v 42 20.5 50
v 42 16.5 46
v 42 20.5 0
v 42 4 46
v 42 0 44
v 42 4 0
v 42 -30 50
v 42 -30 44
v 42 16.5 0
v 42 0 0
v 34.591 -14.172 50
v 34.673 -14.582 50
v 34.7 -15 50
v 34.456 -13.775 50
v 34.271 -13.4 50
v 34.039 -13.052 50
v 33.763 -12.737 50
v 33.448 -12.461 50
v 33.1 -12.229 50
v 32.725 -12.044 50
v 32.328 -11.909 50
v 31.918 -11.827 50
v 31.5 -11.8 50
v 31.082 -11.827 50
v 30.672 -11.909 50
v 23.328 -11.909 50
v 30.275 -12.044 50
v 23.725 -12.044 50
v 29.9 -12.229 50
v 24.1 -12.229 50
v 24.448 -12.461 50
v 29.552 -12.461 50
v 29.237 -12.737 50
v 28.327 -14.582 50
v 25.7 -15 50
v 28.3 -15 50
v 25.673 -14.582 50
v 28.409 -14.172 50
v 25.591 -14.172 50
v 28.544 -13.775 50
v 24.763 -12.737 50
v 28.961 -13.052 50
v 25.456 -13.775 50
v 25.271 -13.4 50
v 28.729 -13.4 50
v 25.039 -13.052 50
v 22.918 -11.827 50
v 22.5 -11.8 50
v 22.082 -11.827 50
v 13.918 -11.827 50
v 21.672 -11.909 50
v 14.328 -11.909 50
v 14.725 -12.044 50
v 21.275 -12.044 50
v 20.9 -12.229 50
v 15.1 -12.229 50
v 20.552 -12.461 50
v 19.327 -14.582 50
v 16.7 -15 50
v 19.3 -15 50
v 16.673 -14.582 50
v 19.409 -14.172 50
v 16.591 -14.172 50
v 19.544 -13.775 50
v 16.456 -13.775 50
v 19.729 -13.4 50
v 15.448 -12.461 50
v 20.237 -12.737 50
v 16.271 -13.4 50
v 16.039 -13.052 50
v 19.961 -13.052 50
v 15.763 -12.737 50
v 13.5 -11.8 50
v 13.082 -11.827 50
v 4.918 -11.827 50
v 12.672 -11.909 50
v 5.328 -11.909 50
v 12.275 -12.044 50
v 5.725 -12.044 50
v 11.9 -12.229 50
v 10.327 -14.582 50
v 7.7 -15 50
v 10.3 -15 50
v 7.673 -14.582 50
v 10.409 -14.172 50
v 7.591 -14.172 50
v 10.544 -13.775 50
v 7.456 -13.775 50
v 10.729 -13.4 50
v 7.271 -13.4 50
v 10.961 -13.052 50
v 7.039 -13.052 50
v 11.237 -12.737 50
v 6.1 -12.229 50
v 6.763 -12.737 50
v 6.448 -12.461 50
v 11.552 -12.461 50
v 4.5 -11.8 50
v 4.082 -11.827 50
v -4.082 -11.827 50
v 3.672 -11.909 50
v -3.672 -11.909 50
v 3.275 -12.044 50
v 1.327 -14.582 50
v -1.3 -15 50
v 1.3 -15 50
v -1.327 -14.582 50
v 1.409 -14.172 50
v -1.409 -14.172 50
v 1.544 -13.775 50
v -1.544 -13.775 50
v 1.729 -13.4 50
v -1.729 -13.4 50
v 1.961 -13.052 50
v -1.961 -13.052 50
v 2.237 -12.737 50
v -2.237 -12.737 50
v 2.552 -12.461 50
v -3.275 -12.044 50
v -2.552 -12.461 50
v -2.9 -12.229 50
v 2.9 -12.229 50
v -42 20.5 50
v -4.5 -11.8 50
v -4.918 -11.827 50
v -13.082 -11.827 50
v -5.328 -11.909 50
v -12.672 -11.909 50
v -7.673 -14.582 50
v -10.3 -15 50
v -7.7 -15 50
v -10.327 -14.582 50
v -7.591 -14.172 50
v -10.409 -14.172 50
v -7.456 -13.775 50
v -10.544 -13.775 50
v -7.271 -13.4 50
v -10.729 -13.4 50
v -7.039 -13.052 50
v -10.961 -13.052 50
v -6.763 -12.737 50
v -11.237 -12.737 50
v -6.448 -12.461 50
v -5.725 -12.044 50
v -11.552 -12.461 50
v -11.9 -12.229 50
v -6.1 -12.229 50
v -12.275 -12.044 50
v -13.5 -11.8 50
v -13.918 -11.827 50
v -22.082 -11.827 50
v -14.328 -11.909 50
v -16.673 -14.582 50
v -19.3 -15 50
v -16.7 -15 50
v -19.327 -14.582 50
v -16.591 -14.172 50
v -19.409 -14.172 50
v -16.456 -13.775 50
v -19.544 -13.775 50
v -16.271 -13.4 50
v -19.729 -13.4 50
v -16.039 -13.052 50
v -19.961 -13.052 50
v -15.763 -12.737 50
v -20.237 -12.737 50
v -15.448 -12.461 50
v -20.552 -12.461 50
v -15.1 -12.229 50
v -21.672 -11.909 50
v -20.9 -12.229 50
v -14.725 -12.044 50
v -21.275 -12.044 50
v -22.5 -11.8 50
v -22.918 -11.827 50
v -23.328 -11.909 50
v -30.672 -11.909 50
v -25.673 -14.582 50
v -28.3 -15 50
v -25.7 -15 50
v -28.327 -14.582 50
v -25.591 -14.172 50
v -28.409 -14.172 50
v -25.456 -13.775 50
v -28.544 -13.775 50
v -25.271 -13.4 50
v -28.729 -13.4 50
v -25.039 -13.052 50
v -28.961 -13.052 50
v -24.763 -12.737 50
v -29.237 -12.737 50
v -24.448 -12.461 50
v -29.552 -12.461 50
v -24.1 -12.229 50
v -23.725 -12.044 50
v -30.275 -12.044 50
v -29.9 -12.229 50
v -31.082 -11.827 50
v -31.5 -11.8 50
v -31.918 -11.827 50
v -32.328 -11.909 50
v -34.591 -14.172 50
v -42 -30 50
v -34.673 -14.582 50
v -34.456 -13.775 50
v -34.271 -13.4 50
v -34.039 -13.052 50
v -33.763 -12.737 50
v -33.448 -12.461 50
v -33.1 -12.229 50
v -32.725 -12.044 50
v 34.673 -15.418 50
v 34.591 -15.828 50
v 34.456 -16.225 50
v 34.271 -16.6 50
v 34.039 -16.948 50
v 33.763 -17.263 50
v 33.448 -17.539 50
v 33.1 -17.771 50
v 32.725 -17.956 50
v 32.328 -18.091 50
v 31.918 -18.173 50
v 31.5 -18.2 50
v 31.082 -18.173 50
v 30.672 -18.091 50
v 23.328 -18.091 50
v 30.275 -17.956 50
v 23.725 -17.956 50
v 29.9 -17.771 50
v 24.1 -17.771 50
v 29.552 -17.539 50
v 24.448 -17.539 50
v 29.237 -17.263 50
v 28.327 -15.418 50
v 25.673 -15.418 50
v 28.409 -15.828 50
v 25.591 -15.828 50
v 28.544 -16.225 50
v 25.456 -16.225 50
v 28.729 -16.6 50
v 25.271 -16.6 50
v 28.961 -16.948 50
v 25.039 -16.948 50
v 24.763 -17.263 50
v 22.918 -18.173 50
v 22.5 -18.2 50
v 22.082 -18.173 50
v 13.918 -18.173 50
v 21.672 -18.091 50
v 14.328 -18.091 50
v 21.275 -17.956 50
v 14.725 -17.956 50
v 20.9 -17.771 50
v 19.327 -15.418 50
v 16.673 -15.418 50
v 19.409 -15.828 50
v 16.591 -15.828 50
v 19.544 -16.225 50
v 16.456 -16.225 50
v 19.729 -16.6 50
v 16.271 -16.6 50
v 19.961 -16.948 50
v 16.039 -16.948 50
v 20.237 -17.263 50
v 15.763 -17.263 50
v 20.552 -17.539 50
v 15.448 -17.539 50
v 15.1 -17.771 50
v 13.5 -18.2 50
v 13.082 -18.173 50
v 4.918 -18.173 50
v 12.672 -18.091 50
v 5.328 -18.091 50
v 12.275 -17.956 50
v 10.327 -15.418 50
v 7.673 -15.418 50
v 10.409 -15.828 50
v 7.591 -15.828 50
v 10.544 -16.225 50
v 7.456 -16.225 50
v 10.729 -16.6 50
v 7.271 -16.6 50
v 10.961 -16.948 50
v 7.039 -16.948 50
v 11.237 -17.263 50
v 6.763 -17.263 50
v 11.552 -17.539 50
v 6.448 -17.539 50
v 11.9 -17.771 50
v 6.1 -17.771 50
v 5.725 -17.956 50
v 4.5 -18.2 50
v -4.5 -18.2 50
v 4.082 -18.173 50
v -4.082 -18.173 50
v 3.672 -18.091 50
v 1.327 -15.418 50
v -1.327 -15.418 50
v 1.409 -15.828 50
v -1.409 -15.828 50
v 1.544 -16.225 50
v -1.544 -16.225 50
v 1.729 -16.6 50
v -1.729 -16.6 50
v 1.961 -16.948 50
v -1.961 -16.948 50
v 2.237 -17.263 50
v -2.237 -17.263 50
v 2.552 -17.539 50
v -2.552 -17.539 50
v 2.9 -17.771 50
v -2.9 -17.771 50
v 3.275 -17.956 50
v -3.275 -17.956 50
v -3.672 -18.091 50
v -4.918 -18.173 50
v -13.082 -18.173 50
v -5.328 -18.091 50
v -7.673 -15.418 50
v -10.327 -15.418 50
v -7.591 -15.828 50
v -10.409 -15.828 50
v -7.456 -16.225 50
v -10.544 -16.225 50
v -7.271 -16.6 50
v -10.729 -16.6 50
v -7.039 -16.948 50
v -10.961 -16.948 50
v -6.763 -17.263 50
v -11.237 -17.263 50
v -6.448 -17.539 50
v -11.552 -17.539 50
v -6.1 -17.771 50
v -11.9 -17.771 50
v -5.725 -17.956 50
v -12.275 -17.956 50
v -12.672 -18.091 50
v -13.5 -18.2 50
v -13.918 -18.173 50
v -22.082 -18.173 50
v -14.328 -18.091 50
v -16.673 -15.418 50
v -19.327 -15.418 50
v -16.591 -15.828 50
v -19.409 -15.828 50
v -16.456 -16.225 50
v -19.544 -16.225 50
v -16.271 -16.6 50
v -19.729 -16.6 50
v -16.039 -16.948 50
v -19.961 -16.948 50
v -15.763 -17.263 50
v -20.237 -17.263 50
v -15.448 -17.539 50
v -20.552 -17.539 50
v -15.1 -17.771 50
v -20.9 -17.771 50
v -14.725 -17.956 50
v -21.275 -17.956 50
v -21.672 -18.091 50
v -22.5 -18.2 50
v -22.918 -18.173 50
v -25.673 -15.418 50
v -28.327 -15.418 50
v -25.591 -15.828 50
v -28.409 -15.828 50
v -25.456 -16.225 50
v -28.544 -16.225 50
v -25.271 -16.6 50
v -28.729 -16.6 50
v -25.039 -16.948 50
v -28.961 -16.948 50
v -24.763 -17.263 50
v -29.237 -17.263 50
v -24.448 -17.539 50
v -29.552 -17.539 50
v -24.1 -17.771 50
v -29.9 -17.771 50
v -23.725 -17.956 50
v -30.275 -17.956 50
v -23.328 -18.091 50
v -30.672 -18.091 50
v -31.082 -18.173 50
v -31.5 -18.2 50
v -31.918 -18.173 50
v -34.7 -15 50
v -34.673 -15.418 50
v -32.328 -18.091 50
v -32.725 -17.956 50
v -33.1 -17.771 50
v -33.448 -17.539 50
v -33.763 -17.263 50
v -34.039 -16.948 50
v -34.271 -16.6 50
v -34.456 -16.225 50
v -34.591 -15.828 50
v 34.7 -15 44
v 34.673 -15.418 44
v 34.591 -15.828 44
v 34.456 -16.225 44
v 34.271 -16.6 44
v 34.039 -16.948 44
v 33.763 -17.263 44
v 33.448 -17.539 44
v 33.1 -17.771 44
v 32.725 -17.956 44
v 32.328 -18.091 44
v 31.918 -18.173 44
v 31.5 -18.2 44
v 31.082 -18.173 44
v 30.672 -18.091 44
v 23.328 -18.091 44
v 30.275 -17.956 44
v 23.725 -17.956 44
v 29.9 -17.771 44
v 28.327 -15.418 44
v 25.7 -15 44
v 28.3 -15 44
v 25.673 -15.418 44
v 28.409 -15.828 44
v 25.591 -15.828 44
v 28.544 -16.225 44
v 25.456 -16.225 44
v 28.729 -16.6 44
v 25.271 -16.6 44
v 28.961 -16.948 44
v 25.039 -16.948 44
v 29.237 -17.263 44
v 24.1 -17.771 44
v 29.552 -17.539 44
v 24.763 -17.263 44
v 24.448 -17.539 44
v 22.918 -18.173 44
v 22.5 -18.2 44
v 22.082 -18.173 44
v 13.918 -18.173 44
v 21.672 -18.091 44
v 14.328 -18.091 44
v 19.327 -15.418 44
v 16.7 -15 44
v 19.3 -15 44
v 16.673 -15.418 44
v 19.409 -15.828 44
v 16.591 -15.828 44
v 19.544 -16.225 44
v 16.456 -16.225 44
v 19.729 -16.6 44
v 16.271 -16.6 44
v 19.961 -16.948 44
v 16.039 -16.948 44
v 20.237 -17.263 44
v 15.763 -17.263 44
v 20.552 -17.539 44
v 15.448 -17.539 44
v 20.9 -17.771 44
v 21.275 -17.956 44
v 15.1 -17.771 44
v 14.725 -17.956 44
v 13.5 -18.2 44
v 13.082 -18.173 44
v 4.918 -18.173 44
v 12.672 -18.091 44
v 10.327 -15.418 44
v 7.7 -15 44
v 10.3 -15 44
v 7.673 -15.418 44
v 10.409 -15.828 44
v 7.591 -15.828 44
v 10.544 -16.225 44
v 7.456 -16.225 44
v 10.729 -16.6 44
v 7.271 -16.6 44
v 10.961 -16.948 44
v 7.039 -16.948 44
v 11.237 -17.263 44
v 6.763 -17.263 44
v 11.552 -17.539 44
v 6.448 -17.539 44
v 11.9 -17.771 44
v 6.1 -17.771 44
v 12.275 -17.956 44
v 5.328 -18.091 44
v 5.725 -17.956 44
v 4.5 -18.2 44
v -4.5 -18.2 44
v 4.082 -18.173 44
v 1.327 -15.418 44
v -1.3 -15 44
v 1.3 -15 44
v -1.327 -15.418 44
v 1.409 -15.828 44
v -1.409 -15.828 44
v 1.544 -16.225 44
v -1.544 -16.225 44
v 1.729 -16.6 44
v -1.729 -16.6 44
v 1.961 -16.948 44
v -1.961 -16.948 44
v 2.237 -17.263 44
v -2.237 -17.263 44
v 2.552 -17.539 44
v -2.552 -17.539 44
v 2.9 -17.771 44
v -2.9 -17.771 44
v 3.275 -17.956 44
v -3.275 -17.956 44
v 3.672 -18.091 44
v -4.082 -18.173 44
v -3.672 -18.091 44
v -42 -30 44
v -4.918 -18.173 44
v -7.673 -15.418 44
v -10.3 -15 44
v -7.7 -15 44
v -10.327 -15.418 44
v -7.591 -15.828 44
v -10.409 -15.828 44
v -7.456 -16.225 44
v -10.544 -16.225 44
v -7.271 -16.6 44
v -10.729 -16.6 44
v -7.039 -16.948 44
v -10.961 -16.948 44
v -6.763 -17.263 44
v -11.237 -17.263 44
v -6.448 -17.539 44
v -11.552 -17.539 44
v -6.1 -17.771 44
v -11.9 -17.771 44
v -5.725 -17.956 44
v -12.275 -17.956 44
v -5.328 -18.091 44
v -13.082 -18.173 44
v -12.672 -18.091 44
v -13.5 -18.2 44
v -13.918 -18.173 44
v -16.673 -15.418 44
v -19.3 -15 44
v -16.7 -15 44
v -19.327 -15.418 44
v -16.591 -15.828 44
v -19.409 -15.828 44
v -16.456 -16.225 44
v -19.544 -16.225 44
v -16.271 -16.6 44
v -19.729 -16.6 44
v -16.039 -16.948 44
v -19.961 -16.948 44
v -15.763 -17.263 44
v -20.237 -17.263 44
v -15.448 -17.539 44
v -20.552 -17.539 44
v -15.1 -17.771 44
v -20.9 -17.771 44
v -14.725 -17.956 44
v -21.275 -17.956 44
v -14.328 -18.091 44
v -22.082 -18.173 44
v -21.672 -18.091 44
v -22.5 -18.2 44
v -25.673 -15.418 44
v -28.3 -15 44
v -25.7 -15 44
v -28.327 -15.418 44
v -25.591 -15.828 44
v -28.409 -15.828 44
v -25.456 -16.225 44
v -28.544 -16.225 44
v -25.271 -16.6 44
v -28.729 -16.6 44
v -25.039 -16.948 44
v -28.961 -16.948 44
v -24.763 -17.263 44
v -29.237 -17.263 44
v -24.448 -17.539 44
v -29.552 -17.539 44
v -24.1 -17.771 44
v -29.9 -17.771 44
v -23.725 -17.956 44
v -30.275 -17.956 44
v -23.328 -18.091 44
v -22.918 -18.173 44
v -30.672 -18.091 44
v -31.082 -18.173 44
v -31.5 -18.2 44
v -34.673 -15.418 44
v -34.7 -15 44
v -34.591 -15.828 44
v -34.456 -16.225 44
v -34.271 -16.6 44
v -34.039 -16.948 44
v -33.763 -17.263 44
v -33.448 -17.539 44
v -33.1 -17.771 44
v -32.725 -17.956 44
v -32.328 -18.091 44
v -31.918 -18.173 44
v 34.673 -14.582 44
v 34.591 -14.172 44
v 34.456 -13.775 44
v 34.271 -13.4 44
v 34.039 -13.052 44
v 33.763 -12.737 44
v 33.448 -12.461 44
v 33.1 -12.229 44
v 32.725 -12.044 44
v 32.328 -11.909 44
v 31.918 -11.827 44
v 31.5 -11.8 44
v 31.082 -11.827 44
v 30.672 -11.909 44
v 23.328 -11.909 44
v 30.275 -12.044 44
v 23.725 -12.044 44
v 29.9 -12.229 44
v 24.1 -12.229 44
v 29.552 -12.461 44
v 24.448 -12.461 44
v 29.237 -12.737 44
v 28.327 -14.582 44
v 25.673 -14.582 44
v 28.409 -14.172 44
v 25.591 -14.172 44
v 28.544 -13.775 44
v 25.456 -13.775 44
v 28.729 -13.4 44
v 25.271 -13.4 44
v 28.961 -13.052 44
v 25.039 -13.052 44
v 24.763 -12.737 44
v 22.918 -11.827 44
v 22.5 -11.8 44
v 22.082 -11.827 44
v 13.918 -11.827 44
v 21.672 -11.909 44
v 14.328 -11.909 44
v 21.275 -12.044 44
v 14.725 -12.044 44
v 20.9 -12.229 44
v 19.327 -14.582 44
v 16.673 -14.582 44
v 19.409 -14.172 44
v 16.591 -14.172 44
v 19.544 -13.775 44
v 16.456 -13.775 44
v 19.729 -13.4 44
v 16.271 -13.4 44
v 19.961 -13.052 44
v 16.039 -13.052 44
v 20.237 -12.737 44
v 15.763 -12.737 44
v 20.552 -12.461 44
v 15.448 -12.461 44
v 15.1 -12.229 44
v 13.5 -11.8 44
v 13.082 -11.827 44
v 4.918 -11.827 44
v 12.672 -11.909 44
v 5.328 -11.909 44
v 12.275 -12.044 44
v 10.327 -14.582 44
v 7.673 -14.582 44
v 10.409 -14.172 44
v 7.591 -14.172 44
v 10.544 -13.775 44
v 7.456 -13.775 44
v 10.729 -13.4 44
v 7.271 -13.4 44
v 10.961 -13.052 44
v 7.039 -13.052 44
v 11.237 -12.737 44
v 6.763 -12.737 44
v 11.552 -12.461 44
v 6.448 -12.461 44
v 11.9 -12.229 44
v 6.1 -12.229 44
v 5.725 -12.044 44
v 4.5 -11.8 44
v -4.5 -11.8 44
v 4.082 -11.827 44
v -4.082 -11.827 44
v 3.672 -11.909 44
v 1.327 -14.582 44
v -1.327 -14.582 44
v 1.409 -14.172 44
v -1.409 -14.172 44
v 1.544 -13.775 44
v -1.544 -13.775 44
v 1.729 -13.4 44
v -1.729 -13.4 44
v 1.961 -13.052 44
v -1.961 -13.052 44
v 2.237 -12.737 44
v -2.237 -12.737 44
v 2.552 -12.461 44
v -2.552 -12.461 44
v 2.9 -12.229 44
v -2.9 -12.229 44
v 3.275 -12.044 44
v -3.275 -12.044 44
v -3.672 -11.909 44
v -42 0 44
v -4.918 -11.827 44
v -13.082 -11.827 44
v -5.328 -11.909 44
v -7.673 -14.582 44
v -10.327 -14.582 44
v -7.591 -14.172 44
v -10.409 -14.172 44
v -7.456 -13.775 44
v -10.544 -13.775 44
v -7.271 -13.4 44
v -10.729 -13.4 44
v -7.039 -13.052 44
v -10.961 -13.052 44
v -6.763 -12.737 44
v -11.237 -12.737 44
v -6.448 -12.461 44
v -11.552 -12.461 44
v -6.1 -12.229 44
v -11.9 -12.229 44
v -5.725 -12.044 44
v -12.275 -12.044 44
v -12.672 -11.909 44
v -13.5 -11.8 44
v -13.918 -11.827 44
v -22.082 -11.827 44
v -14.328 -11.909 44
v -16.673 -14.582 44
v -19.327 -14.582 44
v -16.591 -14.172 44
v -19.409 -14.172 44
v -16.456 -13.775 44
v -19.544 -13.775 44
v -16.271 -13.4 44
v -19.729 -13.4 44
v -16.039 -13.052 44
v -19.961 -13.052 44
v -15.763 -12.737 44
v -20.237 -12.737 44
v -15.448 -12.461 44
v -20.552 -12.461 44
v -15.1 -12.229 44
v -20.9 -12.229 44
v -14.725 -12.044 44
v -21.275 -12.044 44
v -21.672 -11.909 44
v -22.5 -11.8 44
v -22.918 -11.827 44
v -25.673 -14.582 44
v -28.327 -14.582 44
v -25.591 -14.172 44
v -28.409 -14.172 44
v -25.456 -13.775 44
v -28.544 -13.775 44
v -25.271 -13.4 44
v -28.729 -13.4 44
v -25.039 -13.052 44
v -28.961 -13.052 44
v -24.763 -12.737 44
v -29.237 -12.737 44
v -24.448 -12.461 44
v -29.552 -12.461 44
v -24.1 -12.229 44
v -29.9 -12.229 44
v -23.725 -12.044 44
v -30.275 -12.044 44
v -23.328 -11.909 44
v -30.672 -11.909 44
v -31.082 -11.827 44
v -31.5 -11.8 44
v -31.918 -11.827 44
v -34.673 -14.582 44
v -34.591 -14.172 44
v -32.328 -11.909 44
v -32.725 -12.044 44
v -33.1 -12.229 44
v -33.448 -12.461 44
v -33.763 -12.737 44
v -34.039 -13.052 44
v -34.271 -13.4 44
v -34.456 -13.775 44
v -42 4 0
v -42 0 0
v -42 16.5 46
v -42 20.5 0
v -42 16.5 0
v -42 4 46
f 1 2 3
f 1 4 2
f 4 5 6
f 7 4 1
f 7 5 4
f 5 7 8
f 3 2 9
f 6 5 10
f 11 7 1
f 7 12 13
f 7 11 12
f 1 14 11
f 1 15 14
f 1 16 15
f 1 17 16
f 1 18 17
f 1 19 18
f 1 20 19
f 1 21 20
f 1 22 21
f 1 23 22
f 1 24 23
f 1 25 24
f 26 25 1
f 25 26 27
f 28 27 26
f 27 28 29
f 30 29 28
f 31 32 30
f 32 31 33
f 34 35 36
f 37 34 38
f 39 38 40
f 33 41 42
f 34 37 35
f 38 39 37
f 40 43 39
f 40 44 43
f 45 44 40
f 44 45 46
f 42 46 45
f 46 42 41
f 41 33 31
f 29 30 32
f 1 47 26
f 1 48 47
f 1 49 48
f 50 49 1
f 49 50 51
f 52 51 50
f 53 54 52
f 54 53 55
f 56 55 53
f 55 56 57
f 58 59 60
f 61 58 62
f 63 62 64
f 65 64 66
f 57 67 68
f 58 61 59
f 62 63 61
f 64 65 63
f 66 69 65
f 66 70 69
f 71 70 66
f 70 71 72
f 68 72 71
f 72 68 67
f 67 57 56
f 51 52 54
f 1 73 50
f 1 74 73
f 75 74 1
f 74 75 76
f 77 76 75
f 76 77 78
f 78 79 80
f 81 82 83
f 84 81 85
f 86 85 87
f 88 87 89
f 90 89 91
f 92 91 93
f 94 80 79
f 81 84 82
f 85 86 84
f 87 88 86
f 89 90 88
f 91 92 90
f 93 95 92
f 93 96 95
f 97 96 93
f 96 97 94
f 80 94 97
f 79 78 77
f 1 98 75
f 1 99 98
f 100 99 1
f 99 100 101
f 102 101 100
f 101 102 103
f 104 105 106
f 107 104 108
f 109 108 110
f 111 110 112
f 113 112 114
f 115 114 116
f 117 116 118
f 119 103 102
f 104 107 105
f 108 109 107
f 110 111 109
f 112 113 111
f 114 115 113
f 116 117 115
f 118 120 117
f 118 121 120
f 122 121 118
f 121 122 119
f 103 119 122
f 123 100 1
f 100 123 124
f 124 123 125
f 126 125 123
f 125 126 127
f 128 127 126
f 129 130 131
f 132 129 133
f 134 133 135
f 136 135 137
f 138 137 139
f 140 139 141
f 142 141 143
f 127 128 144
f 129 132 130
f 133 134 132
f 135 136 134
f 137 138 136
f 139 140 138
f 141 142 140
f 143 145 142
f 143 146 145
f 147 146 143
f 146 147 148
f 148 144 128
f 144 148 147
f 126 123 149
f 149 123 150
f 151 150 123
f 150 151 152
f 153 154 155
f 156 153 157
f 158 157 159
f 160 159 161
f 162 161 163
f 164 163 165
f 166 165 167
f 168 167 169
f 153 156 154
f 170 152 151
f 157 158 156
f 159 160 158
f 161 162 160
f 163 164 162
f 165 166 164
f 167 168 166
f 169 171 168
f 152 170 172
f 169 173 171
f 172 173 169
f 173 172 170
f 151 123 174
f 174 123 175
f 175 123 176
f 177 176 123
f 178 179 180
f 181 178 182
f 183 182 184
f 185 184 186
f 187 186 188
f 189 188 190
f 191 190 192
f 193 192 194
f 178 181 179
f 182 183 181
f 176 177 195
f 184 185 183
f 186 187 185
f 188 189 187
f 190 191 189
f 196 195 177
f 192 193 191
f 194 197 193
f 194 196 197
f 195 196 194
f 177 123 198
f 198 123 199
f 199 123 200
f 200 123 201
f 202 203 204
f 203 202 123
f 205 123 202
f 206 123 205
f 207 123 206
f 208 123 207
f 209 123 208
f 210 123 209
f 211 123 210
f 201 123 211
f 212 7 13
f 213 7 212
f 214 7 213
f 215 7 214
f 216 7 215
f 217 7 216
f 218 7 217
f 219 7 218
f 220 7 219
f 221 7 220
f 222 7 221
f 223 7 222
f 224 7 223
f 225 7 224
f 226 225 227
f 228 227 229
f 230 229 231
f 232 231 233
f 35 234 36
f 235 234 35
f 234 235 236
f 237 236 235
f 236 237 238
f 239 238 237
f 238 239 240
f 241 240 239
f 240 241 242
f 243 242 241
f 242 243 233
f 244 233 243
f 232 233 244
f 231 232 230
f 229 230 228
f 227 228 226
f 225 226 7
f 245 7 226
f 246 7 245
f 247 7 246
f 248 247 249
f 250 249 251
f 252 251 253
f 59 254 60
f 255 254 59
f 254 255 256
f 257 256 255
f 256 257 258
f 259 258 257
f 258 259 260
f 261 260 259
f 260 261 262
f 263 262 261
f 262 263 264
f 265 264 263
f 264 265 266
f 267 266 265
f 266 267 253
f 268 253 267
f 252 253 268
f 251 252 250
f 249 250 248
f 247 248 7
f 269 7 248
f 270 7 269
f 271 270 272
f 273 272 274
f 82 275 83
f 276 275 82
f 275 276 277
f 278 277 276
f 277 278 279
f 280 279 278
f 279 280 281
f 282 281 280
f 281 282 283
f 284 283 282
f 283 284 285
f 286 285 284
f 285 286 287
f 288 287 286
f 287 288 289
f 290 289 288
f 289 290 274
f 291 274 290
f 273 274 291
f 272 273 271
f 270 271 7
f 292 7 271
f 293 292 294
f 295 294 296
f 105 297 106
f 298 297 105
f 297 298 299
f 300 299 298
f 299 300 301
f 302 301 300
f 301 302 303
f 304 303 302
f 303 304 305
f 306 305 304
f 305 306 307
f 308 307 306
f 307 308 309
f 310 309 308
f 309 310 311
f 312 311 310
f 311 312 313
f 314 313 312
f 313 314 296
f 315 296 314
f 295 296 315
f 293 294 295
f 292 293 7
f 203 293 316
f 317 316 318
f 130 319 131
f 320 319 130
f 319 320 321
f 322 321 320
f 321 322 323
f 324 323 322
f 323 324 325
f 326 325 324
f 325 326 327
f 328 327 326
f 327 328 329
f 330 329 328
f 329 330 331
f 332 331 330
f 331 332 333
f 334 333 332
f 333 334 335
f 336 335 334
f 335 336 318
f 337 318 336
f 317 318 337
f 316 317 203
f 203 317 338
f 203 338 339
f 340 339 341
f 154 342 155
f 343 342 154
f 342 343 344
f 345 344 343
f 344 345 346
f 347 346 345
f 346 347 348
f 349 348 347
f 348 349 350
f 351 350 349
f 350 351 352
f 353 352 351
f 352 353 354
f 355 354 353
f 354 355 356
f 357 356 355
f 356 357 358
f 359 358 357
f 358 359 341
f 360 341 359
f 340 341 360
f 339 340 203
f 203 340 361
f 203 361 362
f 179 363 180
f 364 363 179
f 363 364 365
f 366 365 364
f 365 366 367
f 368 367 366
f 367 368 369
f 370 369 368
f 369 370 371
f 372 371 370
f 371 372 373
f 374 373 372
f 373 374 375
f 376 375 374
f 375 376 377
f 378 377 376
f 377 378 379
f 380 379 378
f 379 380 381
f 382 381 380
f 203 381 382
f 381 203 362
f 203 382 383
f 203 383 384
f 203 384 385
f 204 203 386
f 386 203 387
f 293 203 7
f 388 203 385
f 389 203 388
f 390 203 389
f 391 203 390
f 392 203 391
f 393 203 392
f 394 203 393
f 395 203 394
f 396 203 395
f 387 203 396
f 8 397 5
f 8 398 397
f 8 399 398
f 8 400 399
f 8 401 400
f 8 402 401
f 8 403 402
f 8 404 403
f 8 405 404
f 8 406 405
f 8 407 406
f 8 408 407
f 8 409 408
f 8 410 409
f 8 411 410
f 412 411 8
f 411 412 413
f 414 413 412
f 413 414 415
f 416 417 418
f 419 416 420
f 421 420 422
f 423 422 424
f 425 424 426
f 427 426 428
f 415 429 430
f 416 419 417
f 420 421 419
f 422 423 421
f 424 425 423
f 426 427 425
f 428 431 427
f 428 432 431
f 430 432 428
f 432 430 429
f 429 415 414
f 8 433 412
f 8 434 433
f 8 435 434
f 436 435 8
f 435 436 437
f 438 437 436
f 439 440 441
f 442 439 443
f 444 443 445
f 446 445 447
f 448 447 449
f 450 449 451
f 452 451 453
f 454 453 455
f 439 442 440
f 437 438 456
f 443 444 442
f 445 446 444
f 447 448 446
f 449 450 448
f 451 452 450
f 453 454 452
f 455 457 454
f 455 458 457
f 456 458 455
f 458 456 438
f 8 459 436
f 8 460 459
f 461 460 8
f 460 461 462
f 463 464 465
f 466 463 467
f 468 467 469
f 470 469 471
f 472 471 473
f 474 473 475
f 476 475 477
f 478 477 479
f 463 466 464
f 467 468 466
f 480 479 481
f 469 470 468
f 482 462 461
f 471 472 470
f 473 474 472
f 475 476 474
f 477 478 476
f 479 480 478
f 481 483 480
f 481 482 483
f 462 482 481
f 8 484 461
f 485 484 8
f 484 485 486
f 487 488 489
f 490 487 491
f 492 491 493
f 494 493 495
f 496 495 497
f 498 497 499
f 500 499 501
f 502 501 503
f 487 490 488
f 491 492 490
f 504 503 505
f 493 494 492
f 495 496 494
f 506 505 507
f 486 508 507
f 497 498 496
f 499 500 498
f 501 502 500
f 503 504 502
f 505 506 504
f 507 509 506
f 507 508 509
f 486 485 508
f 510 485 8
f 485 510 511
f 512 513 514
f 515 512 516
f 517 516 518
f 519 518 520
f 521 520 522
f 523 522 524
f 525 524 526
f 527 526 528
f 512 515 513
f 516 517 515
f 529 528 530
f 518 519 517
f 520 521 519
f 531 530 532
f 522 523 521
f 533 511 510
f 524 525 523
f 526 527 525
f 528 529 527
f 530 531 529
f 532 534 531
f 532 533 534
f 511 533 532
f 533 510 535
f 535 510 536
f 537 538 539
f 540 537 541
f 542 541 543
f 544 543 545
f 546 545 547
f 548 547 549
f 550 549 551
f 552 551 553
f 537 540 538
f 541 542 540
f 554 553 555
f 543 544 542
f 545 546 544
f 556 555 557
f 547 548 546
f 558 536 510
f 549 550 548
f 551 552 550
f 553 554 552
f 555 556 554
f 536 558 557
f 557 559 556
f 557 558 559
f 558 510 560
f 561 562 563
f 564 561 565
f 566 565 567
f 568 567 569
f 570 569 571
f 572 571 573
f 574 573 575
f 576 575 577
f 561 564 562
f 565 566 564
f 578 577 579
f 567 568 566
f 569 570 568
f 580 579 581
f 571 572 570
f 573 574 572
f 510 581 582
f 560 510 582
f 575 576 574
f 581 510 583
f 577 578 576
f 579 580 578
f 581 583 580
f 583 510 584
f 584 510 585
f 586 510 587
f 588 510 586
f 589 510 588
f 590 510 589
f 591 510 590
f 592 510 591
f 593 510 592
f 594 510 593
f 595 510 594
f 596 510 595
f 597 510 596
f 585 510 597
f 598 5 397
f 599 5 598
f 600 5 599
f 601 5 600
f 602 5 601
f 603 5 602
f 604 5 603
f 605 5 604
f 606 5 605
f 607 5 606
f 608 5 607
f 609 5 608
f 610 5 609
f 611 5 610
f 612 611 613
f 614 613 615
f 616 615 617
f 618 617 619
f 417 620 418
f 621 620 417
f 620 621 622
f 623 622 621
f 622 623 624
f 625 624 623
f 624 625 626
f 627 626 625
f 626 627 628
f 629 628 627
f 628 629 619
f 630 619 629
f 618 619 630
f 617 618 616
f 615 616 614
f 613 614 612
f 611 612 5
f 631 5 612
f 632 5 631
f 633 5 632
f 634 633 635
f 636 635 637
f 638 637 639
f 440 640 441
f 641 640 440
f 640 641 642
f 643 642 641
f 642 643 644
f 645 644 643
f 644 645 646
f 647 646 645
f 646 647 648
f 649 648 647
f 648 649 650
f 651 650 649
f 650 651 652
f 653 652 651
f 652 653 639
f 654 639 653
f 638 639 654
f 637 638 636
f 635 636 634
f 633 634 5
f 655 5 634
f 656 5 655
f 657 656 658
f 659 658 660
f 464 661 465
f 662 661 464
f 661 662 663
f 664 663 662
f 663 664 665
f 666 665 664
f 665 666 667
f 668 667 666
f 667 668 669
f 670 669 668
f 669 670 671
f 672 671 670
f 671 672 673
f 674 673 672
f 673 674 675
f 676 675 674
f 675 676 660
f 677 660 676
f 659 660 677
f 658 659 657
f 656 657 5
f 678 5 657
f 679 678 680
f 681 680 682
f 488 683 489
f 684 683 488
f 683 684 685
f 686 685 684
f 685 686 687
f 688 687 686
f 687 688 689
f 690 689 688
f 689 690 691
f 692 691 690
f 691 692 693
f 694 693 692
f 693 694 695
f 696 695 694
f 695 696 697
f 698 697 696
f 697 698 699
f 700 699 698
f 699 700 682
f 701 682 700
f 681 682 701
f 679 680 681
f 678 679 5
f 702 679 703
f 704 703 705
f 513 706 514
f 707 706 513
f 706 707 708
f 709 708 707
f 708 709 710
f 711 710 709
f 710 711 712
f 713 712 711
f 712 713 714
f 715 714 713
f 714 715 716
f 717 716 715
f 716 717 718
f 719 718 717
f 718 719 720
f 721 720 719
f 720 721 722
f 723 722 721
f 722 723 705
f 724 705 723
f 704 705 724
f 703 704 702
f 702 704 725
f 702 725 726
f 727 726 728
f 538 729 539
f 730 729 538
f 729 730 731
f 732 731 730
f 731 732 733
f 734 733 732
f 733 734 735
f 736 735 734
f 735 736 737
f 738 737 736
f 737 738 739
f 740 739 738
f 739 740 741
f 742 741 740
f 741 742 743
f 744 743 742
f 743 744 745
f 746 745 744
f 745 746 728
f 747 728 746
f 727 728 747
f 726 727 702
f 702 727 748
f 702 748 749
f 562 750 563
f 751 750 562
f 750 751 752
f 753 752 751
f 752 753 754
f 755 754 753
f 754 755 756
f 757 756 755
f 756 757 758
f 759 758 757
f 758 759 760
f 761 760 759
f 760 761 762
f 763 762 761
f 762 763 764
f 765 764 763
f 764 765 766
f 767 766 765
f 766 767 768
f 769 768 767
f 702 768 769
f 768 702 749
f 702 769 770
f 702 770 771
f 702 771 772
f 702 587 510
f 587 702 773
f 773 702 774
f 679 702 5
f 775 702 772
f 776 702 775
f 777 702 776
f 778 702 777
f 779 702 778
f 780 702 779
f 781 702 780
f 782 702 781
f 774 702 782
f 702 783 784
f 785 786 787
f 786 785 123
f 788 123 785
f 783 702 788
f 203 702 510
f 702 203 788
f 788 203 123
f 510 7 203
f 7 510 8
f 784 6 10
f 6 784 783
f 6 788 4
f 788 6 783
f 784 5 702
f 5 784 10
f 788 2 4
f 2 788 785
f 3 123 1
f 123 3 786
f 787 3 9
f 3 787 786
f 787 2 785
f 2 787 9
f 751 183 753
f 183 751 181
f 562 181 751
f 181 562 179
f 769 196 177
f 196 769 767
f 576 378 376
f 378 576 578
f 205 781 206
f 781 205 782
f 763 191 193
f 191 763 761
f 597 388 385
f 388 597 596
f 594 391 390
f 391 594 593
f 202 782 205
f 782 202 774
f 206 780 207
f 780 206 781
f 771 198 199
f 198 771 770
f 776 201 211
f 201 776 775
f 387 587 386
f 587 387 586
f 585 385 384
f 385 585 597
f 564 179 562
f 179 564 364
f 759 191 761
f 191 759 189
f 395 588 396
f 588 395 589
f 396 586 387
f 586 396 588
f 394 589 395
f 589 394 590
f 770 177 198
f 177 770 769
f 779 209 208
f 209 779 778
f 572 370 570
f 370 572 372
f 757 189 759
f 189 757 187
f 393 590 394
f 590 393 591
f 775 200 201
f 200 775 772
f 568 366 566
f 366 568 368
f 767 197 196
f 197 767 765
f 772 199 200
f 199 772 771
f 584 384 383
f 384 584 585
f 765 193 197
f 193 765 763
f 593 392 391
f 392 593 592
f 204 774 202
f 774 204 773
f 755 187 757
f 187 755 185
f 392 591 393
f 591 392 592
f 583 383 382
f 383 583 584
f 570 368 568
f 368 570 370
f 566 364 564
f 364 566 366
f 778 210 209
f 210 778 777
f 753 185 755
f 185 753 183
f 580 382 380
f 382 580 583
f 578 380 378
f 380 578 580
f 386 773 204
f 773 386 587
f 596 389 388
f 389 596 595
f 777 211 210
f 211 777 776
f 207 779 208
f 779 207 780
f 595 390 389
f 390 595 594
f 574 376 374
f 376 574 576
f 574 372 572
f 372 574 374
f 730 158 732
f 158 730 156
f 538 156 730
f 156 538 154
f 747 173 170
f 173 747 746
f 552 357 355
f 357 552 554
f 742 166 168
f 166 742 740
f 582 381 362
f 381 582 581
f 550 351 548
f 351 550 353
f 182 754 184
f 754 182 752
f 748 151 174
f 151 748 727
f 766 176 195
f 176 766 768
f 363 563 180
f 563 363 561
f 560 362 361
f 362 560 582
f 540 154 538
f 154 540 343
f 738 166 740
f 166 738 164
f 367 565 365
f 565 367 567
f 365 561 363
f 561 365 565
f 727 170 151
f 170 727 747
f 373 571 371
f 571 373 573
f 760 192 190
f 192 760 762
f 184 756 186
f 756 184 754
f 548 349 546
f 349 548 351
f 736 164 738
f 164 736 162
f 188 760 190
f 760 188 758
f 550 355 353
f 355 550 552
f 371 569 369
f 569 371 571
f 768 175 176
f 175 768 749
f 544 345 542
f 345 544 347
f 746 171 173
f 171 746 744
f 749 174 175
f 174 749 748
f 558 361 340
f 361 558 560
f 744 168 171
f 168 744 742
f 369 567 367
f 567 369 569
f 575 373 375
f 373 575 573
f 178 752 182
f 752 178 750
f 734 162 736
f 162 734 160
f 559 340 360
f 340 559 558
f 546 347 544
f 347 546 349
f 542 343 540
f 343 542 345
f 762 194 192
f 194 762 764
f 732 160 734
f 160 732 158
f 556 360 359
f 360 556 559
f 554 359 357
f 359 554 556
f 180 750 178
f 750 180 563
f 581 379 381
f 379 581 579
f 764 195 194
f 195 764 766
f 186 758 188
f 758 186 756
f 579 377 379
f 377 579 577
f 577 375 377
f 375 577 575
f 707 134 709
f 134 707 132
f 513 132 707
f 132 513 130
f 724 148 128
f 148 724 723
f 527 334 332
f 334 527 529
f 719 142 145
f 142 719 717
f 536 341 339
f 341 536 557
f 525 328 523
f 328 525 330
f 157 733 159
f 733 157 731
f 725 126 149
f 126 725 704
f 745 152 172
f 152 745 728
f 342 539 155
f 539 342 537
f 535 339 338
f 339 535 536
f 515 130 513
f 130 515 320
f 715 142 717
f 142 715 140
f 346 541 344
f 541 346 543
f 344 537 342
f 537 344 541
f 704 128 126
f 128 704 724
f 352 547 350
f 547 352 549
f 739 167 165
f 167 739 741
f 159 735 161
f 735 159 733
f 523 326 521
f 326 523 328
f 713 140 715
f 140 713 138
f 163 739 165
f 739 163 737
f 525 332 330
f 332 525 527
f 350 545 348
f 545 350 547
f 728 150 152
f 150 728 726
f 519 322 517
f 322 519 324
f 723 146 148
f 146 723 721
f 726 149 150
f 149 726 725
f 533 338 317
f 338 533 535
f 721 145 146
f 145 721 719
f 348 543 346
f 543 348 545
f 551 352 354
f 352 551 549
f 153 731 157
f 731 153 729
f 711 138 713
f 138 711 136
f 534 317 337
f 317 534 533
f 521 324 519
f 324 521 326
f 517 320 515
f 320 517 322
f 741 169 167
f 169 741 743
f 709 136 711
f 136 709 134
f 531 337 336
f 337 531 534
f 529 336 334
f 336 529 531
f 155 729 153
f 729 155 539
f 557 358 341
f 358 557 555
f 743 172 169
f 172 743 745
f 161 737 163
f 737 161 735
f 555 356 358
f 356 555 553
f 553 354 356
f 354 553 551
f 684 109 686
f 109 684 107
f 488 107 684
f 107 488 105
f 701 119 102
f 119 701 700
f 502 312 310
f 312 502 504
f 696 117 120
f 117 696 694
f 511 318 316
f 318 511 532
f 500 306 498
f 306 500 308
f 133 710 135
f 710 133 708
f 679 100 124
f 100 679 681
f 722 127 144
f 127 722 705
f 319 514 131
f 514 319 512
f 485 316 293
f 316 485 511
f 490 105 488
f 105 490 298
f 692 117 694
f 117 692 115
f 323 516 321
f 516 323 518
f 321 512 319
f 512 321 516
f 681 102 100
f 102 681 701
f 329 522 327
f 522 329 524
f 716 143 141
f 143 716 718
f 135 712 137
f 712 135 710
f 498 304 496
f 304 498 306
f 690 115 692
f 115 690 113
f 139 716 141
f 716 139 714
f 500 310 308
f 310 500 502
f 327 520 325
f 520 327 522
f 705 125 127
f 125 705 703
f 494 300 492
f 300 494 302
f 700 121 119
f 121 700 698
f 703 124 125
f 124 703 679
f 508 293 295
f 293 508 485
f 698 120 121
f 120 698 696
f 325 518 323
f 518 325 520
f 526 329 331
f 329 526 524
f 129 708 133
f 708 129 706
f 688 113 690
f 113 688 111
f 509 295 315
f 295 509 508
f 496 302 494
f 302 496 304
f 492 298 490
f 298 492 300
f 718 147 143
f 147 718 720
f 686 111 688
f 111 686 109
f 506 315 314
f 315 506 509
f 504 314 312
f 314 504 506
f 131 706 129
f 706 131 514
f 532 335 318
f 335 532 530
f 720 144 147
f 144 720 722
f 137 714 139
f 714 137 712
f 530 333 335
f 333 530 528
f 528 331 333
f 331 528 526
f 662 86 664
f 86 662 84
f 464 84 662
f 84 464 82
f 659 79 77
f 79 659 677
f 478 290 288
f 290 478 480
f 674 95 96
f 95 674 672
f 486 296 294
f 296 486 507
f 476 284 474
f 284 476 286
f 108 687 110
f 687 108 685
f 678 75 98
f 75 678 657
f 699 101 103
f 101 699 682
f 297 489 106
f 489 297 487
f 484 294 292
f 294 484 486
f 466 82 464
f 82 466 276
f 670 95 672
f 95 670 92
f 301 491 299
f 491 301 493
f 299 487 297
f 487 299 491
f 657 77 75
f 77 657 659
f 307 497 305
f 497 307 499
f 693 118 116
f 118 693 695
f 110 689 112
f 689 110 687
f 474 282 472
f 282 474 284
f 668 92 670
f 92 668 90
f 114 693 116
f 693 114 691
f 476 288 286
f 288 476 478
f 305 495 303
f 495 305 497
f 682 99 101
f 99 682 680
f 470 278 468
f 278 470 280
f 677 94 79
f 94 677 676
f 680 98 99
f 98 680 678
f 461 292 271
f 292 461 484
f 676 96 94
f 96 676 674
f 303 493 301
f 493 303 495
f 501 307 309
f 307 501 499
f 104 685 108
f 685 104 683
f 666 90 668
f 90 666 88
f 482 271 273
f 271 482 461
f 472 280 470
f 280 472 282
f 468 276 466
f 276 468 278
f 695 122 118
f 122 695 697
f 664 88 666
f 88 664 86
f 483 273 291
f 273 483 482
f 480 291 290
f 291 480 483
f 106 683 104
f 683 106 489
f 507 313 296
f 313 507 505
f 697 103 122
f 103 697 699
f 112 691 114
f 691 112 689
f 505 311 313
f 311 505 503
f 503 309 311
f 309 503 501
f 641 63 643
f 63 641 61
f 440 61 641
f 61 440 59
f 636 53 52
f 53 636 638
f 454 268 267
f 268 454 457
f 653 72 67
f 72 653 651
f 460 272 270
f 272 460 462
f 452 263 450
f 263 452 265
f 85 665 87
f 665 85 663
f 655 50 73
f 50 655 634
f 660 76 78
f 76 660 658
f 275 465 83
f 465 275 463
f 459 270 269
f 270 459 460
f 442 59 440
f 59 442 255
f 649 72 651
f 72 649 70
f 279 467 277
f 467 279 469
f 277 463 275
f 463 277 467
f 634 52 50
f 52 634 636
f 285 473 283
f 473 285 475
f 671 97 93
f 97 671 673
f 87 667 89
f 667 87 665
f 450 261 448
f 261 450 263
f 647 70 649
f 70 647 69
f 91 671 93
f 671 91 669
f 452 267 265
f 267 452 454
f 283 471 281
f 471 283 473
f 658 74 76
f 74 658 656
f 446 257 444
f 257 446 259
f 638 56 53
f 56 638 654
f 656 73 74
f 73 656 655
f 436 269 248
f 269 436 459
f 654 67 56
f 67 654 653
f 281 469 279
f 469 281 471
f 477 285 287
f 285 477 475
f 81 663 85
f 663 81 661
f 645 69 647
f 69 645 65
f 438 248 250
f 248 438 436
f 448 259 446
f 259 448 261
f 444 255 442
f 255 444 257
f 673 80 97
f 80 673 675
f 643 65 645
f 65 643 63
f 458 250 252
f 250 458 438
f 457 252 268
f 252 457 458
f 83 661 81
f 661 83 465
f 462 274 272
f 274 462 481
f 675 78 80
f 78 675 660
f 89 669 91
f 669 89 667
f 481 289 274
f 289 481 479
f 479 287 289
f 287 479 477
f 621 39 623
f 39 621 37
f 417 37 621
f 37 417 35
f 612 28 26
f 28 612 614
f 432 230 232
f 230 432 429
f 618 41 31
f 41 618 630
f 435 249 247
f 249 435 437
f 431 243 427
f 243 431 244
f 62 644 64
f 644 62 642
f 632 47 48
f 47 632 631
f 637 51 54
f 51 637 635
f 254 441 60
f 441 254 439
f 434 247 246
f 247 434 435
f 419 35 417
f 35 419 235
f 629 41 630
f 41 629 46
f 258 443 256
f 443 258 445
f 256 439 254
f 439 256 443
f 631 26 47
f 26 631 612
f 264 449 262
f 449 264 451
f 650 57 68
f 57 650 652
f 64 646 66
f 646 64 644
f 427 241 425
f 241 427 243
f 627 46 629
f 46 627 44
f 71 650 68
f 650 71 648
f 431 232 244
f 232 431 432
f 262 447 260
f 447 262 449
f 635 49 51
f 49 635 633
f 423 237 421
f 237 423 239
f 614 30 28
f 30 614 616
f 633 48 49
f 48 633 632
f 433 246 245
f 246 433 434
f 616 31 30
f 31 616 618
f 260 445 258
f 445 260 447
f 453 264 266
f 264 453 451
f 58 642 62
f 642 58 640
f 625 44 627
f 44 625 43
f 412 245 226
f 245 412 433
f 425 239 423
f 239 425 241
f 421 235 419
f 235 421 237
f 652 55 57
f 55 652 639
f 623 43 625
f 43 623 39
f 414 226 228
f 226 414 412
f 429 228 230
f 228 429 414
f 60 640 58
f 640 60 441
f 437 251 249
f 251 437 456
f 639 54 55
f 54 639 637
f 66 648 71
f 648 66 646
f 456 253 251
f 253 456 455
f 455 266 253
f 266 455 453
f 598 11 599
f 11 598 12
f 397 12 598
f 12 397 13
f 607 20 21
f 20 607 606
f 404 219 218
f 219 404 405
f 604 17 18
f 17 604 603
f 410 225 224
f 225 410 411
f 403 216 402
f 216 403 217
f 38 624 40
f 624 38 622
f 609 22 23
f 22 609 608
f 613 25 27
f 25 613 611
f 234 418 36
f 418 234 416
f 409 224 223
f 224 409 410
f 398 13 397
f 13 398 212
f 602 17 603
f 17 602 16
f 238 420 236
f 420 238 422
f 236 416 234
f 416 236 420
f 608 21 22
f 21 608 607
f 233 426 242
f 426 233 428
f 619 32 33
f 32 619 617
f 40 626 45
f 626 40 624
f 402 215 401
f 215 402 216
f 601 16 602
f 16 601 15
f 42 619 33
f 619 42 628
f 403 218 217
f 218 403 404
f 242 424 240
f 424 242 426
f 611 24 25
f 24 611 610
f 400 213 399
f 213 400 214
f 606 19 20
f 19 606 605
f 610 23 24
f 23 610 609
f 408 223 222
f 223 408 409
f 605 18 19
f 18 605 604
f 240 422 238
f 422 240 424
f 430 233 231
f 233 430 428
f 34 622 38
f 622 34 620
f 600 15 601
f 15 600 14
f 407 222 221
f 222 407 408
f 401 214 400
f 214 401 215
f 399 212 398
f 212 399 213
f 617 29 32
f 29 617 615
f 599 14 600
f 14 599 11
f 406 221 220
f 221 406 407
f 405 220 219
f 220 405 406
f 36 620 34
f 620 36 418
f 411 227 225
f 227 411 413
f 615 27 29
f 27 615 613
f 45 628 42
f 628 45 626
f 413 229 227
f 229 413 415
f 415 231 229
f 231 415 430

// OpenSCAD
// KNOWN-WRONG PART (must fail): the ledge sticks out at the top (z = 44 to 50) instead of at the foot
// Holder that hangs one 8-tube PCR strip inside an ice bucket, hooked over its 12 mm wall
// Category: quick fixes. An upside-down U (two legs and a bridge) that fits over the wall, and a
// ledge at the foot of the inner leg with eight tube holes, so the tubes sit down in the ice.
// Print: PLA or PETG, as used (both legs and the ledge on the bed); the bridge spans 12.5 mm.
// SPDX-License-Identifier: CERN-OHL-P-2.0

/* [Hanger] */
length = 84;              // along X, centred
leg_t = 4;
gap = 12.5;               // 12 mm bucket wall + clearance
leg_h = 50;               // both legs from z = 0 to 50
bridge_t = 4;             // bridge from z = 46 to 50
ledge = [30, 6];          // ledge reaches 30 mm toward -Y, 6 mm thick
hole_d = 6.4;
n = 8;
pitch = 9;
hole_y = -15;

/* [Hidden] */
eps = 0.01;
outer_y = leg_t + gap;    // outer leg from y = 16.5 to 20.5

difference() {
    union() {
        translate([-length / 2, -ledge[0], leg_h - ledge[1]]) cube([length, ledge[0] + eps, ledge[1]]);
        translate([-length / 2, 0, 0]) cube([length, leg_t, leg_h]);
        translate([-length / 2, 0, leg_h - bridge_t]) cube([length, outer_y + leg_t, bridge_t]);
        translate([-length / 2, outer_y, 0]) cube([length, leg_t, leg_h]);
    }
    for (i = [0 : n - 1])
        translate([(i - (n - 1) / 2) * pitch, hole_y, leg_h - ledge[1] - 1]) cylinder(d = hole_d, h = ledge[1] + 2, $fn = 48);
}
